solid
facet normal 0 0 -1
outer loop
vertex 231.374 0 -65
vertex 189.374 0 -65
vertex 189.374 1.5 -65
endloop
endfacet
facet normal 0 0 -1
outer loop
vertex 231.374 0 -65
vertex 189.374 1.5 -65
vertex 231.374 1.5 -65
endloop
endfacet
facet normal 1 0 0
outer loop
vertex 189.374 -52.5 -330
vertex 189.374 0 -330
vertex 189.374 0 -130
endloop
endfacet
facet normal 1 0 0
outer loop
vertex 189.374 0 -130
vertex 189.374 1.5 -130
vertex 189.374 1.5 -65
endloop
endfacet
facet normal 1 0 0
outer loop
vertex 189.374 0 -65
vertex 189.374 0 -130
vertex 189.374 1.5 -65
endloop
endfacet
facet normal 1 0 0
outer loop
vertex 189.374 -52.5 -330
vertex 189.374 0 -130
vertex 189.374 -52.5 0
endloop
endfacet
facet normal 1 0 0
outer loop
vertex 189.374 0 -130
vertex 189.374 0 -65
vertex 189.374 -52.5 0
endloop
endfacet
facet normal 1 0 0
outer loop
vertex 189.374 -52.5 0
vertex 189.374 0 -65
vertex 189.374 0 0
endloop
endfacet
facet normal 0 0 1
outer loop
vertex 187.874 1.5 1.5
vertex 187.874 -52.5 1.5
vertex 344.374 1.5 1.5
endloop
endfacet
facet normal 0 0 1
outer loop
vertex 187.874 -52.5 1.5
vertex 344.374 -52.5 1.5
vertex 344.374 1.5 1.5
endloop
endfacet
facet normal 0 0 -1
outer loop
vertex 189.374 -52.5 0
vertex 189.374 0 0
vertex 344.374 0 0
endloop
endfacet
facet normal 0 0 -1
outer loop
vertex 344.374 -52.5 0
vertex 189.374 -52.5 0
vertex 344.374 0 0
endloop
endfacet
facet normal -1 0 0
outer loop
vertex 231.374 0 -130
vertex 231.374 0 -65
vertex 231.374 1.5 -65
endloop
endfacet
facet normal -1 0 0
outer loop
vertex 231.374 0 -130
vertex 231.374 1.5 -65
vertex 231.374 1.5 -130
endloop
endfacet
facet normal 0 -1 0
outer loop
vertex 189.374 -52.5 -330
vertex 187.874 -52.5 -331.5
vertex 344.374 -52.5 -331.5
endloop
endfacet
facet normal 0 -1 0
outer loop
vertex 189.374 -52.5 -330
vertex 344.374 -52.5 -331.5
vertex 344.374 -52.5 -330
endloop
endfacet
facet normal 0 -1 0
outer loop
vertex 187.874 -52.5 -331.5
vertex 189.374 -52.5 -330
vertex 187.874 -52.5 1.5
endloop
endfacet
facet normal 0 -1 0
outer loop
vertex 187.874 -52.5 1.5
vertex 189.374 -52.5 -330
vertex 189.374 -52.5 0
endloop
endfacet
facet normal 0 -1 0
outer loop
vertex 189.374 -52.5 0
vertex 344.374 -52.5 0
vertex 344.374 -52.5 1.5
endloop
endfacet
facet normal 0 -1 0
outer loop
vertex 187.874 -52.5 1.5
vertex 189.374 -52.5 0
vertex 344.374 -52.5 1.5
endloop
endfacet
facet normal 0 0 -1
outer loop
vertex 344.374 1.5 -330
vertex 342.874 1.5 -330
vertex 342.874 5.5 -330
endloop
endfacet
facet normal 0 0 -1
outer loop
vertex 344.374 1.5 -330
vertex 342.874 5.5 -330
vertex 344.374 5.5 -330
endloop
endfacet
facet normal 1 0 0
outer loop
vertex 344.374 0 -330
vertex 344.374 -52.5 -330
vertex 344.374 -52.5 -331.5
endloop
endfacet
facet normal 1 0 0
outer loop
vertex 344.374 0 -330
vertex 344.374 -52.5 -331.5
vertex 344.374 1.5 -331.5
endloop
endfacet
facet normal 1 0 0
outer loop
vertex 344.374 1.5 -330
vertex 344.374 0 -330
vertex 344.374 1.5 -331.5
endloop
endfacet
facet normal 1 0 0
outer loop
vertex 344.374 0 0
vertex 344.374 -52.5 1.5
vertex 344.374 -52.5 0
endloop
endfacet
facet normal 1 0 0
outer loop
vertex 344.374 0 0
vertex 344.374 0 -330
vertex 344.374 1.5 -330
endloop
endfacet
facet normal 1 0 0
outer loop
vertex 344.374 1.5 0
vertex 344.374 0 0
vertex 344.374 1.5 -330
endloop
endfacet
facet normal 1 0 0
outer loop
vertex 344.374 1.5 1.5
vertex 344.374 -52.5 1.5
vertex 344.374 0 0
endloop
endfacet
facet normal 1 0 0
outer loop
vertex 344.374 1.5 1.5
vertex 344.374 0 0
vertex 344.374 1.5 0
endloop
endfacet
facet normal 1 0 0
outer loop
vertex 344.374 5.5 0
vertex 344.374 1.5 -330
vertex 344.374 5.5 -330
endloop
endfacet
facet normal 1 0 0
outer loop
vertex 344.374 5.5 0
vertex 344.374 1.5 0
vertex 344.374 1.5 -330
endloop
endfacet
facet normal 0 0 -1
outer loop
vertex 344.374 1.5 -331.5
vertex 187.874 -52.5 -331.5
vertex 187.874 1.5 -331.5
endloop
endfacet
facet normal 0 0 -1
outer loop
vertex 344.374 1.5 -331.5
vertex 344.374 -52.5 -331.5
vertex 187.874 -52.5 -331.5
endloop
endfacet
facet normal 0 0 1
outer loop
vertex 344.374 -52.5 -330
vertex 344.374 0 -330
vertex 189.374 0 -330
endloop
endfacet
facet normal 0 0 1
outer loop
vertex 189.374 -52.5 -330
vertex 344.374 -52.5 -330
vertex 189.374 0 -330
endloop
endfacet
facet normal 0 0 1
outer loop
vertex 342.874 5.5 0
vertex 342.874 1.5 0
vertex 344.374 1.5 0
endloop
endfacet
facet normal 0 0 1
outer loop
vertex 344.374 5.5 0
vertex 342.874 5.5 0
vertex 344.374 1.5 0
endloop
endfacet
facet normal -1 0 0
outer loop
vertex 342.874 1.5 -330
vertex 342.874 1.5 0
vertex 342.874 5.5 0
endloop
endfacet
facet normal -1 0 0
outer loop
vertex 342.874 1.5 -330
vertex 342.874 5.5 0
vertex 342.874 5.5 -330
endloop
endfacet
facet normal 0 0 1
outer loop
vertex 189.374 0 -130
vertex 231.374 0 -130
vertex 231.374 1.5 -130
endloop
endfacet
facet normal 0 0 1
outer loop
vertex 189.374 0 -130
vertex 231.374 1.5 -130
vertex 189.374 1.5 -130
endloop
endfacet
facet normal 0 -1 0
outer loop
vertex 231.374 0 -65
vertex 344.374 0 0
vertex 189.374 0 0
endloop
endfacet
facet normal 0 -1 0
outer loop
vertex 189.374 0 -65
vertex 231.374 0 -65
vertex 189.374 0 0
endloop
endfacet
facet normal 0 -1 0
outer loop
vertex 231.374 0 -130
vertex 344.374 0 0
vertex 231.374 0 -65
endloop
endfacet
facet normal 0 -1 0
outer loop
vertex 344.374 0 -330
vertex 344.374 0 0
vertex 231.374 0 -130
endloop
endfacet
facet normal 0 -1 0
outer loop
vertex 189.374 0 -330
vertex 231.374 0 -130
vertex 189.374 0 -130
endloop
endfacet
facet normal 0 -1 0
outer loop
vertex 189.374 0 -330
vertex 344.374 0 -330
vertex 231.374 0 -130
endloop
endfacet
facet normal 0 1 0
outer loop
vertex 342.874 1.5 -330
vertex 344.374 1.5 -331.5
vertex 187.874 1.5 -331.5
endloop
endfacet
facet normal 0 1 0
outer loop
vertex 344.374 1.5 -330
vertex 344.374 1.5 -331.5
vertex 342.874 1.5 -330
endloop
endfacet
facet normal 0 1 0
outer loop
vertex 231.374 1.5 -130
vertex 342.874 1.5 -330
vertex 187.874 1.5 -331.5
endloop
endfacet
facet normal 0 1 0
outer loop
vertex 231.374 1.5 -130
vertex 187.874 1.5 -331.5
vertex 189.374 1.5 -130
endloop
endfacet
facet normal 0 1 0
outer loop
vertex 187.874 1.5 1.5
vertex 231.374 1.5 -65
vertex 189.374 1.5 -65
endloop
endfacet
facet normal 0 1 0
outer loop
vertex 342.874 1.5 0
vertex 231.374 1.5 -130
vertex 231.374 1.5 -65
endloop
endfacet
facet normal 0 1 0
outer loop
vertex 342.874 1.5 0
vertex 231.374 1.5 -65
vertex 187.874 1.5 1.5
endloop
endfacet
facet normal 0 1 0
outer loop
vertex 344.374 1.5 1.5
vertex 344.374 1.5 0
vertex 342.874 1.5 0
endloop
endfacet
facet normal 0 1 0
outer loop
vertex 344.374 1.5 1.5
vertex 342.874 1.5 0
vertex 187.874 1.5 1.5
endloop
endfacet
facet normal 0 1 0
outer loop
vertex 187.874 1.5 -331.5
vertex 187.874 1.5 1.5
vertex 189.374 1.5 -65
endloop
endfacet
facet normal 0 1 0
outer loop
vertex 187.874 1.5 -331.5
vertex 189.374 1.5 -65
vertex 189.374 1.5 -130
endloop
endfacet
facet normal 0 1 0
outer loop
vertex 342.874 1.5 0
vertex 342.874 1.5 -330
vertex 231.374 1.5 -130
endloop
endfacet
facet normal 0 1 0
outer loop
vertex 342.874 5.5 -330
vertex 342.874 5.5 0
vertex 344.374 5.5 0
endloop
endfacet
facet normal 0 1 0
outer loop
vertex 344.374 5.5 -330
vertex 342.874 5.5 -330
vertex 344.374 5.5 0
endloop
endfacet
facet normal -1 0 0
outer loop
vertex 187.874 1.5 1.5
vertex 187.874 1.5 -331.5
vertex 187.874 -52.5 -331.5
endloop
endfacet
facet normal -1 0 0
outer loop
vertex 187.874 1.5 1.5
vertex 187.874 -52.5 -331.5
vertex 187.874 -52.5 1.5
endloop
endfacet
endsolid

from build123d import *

# Parameters (mm, degrees)
BOSS_EXTRUDE4_DEPTH  = 1.5
SKETCH5_W            = 155
SKETCH5_H            = 54
BOSS_EXTRUDE5_DEPTH  = 1.5
SKETCH8_W            = 1.5
SKETCH8_H            = 330
BOSS_EXTRUDE14_DEPTH = 4
SKETCH7_W            = 155
SKETCH7_H            = 54
BOSS_EXTRUDE18_DEPTH = 1.5
SKETCH9_W            = 333
SKETCH9_H            = 54
BOSS_EXTRUDE19_DEPTH = 1.5


with BuildPart() as part:
    # Sketch4 → Boss-Extrude4 (new body)
    with BuildSketch(Plane(origin=(0, 0, 0), x_dir=(1, 0, 0), z_dir=(0, 1, 0))):
        Polygon((189.373653762, 330), (344.373653762, 330), (344.373653762, 0), (189.373653762, 0), (189.373653762, 65), (231.373653762, 65), (231.373653762, 130), (189.373653762, 130), align=None)
    extrude(amount=BOSS_EXTRUDE4_DEPTH)

    # Sketch5 → Boss-Extrude5 (add)
    with BuildSketch(Plane.XY):
        with Locations((266.873653762, -25.5)):
            Rectangle(SKETCH5_W, SKETCH5_H)
    extrude(amount=BOSS_EXTRUDE5_DEPTH)

    # Sketch8 → Boss-Extrude14 (add)
    with BuildSketch(Plane(origin=(0, 1.5, 0), x_dir=(1, 0, 0), z_dir=(0, 1, 0))):
        with Locations((343.623653762, 165)):
            Rectangle(SKETCH8_W, SKETCH8_H)
    extrude(amount=BOSS_EXTRUDE14_DEPTH)

    # Sketch7 → Boss-Extrude18 (add)
    with BuildSketch(Plane(origin=(0, 0, -330), x_dir=(-1, 0, 0), z_dir=(0, 0, -1))):
        with Locations((-266.873653762, -25.5)):
            Rectangle(SKETCH7_W, SKETCH7_H)
    extrude(amount=BOSS_EXTRUDE18_DEPTH)

    # Sketch9 → Boss-Extrude19 (add)
    with BuildSketch(Plane.ZY.offset(-189.373653762)):
        with Locations((-165, -25.5)):
            Rectangle(SKETCH9_W, SKETCH9_H)
    extrude(amount=BOSS_EXTRUDE19_DEPTH)


solid = part.part
